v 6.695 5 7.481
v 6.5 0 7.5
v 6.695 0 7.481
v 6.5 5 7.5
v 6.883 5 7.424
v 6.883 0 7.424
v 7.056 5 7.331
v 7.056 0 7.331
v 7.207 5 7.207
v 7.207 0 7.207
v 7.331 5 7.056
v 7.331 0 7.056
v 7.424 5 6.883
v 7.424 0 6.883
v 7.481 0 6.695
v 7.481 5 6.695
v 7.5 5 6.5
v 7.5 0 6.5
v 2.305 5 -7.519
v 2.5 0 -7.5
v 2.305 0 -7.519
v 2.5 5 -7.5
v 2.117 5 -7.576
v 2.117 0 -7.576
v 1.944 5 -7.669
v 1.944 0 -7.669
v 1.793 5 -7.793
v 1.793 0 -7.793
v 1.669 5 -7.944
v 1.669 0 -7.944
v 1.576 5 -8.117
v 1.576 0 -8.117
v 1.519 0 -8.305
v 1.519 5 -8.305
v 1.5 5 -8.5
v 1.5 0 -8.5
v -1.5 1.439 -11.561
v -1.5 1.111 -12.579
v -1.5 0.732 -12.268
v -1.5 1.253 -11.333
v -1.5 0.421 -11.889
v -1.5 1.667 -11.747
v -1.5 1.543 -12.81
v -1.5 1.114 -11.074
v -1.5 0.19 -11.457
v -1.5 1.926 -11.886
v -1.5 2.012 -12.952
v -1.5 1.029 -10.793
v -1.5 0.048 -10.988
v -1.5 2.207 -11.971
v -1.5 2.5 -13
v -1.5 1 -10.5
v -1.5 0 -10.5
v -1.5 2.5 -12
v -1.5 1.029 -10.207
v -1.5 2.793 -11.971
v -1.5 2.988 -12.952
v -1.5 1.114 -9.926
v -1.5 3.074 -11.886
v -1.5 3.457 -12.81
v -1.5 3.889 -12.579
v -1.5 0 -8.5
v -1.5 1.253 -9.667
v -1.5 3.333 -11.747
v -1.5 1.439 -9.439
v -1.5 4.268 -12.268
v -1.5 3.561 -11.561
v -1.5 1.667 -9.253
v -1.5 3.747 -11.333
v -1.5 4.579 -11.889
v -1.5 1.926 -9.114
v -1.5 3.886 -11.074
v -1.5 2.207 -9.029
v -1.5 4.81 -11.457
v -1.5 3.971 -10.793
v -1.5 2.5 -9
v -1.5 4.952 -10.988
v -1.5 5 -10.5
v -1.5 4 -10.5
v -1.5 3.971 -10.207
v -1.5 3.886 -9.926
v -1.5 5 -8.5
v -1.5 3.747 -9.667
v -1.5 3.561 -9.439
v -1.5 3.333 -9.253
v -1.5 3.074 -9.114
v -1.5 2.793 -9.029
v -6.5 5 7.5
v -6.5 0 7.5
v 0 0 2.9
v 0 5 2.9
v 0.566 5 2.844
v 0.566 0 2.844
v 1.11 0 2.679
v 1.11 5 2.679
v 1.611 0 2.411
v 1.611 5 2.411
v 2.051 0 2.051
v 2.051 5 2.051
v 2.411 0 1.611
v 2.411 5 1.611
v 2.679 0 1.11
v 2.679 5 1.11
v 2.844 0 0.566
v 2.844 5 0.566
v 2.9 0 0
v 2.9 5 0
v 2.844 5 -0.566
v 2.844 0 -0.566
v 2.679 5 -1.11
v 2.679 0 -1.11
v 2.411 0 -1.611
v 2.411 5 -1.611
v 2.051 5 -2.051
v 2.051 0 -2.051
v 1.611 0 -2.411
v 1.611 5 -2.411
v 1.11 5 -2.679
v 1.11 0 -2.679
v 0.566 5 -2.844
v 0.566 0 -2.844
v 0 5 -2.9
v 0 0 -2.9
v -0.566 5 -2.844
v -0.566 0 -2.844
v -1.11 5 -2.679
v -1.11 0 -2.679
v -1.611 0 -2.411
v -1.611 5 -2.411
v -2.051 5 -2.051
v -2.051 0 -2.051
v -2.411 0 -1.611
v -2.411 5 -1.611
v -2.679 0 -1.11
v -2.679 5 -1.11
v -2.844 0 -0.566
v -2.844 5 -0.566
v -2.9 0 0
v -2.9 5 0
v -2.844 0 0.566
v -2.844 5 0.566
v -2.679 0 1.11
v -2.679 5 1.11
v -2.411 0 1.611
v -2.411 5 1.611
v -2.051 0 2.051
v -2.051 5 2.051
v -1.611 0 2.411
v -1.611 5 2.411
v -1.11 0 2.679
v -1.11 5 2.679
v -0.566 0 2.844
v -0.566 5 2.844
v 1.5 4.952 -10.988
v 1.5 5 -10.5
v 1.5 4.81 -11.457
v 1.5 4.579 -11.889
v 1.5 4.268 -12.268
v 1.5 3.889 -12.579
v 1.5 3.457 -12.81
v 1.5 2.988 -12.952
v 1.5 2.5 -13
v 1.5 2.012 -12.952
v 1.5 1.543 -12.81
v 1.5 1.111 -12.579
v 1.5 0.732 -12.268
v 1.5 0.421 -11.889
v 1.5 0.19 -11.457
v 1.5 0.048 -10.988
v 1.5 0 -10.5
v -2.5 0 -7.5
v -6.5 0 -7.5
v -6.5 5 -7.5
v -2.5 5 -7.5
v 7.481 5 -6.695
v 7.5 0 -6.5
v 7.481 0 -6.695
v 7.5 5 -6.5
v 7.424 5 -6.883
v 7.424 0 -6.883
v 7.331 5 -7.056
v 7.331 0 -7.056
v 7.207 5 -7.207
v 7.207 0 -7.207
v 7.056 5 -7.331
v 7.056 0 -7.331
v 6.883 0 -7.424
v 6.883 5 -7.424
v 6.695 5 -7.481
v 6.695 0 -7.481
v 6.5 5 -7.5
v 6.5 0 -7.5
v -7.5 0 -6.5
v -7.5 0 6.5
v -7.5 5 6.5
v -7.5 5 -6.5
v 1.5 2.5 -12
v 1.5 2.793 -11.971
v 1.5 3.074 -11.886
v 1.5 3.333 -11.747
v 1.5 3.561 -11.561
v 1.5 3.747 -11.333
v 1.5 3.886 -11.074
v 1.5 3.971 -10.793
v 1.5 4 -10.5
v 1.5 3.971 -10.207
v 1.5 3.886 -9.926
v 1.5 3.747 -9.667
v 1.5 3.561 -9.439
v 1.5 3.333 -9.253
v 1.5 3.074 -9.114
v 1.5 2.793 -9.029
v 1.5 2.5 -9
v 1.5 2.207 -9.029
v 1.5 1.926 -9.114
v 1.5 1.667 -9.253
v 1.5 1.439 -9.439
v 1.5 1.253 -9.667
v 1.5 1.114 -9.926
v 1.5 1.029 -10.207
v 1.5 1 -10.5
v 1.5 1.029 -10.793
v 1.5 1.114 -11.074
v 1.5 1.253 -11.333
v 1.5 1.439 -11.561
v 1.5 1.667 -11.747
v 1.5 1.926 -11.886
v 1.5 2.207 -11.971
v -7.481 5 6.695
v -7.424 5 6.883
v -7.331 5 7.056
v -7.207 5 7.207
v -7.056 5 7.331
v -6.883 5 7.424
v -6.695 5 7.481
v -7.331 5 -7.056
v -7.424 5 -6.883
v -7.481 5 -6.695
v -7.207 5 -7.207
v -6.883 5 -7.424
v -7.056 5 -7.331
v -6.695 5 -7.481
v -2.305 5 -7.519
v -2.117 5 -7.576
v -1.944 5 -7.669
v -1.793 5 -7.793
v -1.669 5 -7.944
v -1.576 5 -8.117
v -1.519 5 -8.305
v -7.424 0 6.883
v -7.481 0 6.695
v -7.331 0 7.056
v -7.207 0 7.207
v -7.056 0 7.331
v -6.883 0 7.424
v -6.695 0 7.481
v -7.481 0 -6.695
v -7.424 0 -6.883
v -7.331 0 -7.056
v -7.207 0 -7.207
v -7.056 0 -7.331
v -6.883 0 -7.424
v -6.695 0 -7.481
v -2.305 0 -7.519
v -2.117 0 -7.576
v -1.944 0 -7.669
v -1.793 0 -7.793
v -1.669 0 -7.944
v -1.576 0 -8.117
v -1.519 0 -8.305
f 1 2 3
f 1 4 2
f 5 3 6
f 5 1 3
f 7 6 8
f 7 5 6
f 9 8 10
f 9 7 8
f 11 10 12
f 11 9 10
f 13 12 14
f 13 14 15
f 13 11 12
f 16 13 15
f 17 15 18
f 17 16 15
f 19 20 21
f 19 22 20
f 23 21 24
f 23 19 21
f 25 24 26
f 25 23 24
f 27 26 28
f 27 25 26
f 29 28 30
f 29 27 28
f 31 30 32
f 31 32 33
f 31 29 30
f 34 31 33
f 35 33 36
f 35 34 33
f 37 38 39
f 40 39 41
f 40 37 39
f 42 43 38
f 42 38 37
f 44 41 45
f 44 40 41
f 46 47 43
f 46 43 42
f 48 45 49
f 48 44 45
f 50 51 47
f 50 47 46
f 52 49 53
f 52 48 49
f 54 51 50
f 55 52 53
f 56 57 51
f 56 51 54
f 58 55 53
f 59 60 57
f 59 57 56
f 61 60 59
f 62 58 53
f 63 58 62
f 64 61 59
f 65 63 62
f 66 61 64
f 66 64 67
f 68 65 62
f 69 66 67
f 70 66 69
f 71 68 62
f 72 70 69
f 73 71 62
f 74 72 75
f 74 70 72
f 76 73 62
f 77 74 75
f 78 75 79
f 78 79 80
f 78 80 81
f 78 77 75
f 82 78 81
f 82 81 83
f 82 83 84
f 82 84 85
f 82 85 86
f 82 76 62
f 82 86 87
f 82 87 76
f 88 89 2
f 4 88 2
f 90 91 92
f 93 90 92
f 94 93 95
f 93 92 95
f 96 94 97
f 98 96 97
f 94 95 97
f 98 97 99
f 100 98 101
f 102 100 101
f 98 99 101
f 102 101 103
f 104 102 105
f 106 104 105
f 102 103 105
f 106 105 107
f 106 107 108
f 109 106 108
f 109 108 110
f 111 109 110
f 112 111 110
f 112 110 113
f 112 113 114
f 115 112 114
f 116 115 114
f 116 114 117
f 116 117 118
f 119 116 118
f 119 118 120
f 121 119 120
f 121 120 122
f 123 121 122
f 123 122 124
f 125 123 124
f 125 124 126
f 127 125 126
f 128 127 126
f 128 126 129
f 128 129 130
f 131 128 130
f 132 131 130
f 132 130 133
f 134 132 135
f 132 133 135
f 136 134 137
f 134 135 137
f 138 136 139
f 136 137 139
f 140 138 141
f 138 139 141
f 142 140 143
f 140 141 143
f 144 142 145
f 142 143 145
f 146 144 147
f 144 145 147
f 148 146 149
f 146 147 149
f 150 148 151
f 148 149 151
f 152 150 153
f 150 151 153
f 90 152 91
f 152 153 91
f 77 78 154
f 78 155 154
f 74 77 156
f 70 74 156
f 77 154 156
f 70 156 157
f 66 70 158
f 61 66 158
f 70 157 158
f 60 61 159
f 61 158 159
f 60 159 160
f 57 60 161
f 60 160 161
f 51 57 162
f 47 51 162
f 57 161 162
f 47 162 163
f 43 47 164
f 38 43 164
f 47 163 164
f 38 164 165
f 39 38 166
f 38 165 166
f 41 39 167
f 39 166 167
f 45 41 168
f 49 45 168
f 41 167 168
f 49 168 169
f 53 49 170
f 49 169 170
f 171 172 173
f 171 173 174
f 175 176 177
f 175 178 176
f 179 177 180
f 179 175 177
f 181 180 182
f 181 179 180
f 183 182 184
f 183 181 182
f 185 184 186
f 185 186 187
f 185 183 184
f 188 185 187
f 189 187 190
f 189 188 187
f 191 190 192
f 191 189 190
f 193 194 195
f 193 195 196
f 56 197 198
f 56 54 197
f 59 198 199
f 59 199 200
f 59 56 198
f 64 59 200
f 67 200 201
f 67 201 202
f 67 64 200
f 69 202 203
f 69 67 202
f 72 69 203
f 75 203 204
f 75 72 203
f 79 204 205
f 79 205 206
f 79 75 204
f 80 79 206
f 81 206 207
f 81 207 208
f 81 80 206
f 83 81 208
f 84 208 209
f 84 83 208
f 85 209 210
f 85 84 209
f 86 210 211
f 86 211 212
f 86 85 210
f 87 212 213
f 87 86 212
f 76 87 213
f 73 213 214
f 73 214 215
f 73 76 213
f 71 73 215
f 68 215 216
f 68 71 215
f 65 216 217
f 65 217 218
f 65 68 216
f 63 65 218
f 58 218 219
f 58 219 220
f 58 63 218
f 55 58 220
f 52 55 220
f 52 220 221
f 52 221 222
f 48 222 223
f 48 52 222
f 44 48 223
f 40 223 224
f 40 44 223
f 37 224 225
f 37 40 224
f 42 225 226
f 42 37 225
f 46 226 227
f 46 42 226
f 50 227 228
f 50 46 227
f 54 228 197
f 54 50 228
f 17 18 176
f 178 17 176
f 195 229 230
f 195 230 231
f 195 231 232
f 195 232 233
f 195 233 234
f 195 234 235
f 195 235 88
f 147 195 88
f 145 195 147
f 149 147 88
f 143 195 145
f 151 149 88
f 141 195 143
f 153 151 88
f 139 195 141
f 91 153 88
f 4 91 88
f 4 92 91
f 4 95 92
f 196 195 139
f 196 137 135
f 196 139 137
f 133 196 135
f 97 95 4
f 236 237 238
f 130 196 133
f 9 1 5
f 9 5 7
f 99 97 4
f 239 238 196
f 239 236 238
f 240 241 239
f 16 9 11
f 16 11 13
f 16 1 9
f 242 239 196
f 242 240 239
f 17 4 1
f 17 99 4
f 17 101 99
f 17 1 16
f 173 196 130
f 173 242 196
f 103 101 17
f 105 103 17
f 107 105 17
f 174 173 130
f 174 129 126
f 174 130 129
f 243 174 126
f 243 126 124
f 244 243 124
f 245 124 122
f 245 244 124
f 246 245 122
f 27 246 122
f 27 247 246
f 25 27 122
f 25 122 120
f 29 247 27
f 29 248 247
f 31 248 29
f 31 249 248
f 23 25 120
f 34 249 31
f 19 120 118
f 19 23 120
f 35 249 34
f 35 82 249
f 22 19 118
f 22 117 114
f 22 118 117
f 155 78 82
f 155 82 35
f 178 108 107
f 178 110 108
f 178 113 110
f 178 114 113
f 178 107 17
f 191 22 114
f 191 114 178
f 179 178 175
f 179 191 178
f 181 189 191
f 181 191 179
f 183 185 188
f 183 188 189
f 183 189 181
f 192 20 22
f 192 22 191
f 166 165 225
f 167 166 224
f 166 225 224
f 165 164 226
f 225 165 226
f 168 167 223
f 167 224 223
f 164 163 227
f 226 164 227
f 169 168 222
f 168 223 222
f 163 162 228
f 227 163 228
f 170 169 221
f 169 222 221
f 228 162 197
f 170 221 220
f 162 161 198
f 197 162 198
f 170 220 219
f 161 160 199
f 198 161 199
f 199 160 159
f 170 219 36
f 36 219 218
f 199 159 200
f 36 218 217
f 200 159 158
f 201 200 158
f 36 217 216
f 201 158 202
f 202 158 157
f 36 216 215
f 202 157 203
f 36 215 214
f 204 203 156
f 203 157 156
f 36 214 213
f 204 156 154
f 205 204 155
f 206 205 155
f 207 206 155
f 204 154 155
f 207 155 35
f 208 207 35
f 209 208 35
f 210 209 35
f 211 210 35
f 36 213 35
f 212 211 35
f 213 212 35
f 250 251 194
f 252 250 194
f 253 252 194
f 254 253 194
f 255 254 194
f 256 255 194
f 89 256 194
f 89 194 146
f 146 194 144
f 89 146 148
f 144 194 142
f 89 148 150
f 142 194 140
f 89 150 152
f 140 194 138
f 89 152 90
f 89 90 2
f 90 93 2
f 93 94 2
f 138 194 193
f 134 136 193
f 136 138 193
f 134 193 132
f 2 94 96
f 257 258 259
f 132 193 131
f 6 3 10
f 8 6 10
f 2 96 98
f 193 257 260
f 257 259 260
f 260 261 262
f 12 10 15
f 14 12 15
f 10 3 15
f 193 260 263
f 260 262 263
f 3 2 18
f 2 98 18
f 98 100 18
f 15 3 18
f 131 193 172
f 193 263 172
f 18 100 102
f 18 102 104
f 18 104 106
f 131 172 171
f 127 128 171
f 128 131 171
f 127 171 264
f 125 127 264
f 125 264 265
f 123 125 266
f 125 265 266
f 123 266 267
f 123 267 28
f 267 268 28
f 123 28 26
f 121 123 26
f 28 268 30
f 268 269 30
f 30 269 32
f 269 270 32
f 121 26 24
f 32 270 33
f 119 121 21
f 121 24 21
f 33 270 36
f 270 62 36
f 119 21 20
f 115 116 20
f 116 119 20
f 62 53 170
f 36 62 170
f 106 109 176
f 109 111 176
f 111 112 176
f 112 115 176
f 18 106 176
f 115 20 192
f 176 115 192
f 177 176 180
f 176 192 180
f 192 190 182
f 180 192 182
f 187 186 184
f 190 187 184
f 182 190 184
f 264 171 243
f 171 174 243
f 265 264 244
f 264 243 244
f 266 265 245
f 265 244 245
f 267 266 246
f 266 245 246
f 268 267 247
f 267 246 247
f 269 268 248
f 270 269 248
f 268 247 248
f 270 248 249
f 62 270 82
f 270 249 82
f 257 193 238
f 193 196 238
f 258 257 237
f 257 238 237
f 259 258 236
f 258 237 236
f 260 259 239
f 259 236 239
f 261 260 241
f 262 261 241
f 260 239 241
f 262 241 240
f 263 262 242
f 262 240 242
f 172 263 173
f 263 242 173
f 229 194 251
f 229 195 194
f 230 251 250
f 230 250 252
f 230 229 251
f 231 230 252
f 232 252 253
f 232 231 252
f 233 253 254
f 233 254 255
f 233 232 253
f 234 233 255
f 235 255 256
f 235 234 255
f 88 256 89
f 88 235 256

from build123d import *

# Parameters (mm, degrees)
SKETCH1_W           = 15
SKETCH1_H           = 15
BOSS_EXTRUDE1_DEPTH = 5
SKETCH3_R           = 1.5
BOSS_EXTRUDE2_DEPTH = 1.5
CUT_EXTRUDE1_REACH  = 17.819
SKETCH4_R           = 2.9
FILLET1_R           = 1


with BuildPart() as part:
    # Sketch1 → Boss-Extrude1 (new body)
    with BuildSketch(Plane(origin=(0, 0, 0), x_dir=(1, 0, 0), z_dir=(0, 1, 0))):
        Rectangle(SKETCH1_W, SKETCH1_H)
    extrude(amount=BOSS_EXTRUDE1_DEPTH)

    # Sketch3 → Boss-Extrude2 (add, symmetric)
    with BuildSketch(Plane(origin=(0, 0, 0), x_dir=(0, 0, -1), z_dir=(1, 0, 0))):
        with BuildLine():
            Line((7.5, 5), (10.5, 5))
            ThreePointArc((10.5, 5), (13, 2.5), (10.5, 0))
            Line((10.5, 0), (7.5, 0))
            Line((7.5, 0), (7.5, 5))
        make_face()
        with Locations((10.5, 2.5)):
            Circle(SKETCH3_R, mode=Mode.SUBTRACT)
    extrude(amount=BOSS_EXTRUDE2_DEPTH, both=True)

    # Sketch4 → Cut-Extrude1 (cut, up to next)
    with BuildSketch(Plane(origin=(0, 5, 0), x_dir=(1, 0, 0), z_dir=(0, 1, 0)), mode=Mode.PRIVATE) as cut_extrude1_sk1:
        with Locations(Location((0, 0, 0), (0, 0, 270))):
            Circle(SKETCH4_R)
    cut_extrude1_tool1 = extrude(cut_extrude1_sk1.sketch, amount=-CUT_EXTRUDE1_REACH, mode=Mode.PRIVATE) & part.part
    add(cut_extrude1_tool1.solids().sort_by_distance((0, 5, 0))[0], mode=Mode.SUBTRACT)

    # Fillet1
    fillet1_edges = [part.edges().sort_by_distance(p)[0] for p in [
        (1.5, 2.5, -7.5),
        (-1.5, 2.5, -7.5),
        (7.5, 2.5, 7.5),
        (-7.5, 2.5, 7.5),
        (-7.5, 2.5, -7.5),
        (7.5, 2.5, -7.5),
    ]]
    fillet(fillet1_edges, radius=FILLET1_R)


solid = part.part
